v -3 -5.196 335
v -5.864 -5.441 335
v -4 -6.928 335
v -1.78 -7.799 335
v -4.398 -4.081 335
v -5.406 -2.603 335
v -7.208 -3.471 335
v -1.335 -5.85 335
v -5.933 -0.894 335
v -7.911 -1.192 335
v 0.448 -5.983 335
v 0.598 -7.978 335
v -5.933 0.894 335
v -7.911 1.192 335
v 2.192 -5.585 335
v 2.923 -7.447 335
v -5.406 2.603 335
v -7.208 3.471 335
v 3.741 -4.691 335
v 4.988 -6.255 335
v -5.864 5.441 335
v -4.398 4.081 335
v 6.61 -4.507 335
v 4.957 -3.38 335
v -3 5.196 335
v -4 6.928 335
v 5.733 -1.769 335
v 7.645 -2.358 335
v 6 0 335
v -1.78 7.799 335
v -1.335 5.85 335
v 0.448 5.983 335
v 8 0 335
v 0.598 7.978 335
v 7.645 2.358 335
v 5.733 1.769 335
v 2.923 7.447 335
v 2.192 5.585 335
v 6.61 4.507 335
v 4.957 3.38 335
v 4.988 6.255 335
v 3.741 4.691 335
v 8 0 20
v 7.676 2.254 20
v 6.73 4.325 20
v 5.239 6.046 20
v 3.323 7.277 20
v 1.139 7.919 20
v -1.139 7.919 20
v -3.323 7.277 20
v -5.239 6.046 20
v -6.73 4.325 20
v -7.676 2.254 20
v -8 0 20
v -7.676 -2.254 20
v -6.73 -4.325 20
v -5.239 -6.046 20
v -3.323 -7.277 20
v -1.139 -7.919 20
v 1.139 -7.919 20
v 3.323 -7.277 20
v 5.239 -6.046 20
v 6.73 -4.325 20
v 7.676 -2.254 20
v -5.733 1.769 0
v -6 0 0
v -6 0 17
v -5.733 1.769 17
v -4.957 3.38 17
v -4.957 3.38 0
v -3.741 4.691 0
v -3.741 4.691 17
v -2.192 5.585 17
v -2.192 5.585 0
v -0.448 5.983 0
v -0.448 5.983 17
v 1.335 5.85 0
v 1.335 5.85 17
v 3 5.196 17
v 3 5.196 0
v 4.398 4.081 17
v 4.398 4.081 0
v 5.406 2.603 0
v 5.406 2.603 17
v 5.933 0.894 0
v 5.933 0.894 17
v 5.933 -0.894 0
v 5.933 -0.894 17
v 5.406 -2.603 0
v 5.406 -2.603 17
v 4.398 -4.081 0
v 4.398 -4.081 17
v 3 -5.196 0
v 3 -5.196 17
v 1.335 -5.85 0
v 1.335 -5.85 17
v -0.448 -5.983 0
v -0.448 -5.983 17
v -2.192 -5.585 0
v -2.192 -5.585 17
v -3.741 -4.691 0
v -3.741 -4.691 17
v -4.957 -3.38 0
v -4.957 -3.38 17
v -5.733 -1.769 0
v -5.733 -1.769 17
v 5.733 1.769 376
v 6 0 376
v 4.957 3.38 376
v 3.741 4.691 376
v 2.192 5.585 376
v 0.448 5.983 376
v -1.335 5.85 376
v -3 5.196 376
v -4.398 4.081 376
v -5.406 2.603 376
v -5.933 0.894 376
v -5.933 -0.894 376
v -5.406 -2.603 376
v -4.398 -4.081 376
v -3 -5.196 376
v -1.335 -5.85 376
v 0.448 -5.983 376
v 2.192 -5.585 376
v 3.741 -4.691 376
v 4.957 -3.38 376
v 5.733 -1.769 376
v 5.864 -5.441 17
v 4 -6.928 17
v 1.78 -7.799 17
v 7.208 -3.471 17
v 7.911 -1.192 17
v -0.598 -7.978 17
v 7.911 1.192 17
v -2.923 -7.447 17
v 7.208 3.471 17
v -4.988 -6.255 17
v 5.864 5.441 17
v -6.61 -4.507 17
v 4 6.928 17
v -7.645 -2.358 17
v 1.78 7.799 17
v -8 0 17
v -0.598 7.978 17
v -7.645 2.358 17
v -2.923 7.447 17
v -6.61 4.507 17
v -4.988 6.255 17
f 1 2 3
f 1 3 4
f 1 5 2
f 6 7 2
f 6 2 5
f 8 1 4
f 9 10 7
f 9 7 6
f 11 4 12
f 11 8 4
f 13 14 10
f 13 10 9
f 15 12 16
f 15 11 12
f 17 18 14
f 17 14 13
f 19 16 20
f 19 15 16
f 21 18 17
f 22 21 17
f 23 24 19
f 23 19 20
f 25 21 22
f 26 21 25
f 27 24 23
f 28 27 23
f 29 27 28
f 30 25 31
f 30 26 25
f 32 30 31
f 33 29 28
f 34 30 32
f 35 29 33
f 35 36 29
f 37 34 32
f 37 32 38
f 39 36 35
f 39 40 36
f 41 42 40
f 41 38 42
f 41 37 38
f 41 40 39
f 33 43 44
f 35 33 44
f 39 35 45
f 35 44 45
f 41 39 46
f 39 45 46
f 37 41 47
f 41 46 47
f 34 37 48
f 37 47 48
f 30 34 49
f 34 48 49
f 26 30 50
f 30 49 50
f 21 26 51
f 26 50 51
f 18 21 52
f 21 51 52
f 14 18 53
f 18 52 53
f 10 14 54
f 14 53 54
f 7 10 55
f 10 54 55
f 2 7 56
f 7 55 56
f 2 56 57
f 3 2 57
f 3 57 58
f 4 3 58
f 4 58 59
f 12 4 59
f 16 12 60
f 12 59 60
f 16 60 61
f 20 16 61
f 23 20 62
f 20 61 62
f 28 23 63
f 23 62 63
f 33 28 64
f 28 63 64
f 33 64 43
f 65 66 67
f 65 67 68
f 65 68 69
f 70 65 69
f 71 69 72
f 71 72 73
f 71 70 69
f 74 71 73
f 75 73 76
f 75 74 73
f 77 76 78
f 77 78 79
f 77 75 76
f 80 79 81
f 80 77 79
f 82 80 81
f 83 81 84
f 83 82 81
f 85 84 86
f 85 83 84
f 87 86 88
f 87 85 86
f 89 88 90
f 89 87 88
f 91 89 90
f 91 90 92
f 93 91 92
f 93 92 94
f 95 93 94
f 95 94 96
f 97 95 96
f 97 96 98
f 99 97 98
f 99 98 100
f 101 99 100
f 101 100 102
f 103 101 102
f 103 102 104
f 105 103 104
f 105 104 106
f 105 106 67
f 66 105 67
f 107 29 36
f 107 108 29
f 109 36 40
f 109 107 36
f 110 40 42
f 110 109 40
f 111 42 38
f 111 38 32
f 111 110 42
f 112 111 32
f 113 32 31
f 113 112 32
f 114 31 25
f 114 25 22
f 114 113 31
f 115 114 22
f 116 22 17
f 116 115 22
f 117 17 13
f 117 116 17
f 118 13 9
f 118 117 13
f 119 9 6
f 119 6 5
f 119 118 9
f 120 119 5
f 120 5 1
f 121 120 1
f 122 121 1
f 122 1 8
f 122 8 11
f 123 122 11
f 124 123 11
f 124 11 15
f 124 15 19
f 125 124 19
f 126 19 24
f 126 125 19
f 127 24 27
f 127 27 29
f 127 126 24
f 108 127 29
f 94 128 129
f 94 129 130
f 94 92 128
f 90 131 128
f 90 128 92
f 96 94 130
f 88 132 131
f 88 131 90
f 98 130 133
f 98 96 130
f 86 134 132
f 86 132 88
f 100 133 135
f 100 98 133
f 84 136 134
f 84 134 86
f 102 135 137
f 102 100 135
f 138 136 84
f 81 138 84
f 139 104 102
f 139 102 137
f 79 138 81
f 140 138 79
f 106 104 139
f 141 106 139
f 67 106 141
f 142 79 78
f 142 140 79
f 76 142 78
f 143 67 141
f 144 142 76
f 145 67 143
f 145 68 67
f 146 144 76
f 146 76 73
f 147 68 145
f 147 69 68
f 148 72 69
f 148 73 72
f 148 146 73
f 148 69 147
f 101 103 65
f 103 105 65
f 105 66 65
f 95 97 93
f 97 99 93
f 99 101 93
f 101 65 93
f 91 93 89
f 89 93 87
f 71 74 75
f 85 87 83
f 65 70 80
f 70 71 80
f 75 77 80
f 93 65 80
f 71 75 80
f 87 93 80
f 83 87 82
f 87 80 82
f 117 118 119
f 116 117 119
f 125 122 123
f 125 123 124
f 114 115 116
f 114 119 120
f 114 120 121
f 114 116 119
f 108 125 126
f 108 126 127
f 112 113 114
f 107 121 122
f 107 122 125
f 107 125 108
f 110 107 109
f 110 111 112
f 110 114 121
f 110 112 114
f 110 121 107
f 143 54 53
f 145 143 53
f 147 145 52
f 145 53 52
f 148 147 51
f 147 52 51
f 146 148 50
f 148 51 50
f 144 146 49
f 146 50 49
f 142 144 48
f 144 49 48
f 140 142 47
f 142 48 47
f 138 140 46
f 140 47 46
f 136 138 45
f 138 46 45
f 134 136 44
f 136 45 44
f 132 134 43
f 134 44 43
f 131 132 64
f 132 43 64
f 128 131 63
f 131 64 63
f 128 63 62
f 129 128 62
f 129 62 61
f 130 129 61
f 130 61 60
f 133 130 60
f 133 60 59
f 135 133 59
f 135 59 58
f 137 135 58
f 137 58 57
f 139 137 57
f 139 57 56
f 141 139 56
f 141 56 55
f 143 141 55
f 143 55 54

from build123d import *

# Parameters (mm, degrees)
SKETCH1_R          = 8
EXTRUDE1_DEPTH     = 366
SKETCH3_R          = 8
SKETCH3_R_2        = 6
CUT_EXTRUDE1_DEPTH = 34
SKETCH4_R          = 8
SKETCH4_R_2        = 6
CUT_EXTRUDE2_DEPTH = 20
SKETCH5_R          = 6
EXTRUDE2_DEPTH     = 10
SKETCH7_R          = 8
SKETCH7_R_2        = 6
EXTRUDE3_DEPTH     = 3
SKETCH8_R          = 8
SKETCH8_R_2        = 6
EXTRUDE4_DEPTH     = 3


with BuildPart() as part:
    # Sketch1 → Extrude1 (new body)
    with BuildSketch(Plane.XY):
        Circle(SKETCH1_R)
    extrude(amount=EXTRUDE1_DEPTH)

    # Sketch3 → Cut-Extrude1 (cut)
    with BuildSketch(Plane.XY.offset(366)):
        Circle(SKETCH3_R)
        Circle(SKETCH3_R_2, mode=Mode.SUBTRACT)
    extrude(amount=-CUT_EXTRUDE1_DEPTH, mode=Mode.SUBTRACT)

    # Sketch4 → Cut-Extrude2 (cut)
    with BuildSketch(Plane(origin=(0, 0, 0), x_dir=(-1, 0, 0), z_dir=(0, 0, -1))):
        Circle(SKETCH4_R)
        Circle(SKETCH4_R_2, mode=Mode.SUBTRACT)
    extrude(amount=-CUT_EXTRUDE2_DEPTH, mode=Mode.SUBTRACT)

    # Sketch5 → Extrude2 (add)
    with BuildSketch(Plane.XY.offset(366)):
        Circle(SKETCH5_R)
    extrude(amount=EXTRUDE2_DEPTH)

    # Sketch7 → Extrude3 (add)
    with BuildSketch(Plane.XY.offset(332)):
        Circle(SKETCH7_R)
        Circle(SKETCH7_R_2, mode=Mode.SUBTRACT)
    extrude(amount=EXTRUDE3_DEPTH)

    # Sketch8 → Extrude4 (add)
    with BuildSketch(Plane(origin=(0, 0, 20), x_dir=(-1, 0, 0), z_dir=(0, 0, -1))):
        Circle(SKETCH8_R)
        Circle(SKETCH8_R_2, mode=Mode.SUBTRACT)
    extrude(amount=EXTRUDE4_DEPTH)


solid = part.part
